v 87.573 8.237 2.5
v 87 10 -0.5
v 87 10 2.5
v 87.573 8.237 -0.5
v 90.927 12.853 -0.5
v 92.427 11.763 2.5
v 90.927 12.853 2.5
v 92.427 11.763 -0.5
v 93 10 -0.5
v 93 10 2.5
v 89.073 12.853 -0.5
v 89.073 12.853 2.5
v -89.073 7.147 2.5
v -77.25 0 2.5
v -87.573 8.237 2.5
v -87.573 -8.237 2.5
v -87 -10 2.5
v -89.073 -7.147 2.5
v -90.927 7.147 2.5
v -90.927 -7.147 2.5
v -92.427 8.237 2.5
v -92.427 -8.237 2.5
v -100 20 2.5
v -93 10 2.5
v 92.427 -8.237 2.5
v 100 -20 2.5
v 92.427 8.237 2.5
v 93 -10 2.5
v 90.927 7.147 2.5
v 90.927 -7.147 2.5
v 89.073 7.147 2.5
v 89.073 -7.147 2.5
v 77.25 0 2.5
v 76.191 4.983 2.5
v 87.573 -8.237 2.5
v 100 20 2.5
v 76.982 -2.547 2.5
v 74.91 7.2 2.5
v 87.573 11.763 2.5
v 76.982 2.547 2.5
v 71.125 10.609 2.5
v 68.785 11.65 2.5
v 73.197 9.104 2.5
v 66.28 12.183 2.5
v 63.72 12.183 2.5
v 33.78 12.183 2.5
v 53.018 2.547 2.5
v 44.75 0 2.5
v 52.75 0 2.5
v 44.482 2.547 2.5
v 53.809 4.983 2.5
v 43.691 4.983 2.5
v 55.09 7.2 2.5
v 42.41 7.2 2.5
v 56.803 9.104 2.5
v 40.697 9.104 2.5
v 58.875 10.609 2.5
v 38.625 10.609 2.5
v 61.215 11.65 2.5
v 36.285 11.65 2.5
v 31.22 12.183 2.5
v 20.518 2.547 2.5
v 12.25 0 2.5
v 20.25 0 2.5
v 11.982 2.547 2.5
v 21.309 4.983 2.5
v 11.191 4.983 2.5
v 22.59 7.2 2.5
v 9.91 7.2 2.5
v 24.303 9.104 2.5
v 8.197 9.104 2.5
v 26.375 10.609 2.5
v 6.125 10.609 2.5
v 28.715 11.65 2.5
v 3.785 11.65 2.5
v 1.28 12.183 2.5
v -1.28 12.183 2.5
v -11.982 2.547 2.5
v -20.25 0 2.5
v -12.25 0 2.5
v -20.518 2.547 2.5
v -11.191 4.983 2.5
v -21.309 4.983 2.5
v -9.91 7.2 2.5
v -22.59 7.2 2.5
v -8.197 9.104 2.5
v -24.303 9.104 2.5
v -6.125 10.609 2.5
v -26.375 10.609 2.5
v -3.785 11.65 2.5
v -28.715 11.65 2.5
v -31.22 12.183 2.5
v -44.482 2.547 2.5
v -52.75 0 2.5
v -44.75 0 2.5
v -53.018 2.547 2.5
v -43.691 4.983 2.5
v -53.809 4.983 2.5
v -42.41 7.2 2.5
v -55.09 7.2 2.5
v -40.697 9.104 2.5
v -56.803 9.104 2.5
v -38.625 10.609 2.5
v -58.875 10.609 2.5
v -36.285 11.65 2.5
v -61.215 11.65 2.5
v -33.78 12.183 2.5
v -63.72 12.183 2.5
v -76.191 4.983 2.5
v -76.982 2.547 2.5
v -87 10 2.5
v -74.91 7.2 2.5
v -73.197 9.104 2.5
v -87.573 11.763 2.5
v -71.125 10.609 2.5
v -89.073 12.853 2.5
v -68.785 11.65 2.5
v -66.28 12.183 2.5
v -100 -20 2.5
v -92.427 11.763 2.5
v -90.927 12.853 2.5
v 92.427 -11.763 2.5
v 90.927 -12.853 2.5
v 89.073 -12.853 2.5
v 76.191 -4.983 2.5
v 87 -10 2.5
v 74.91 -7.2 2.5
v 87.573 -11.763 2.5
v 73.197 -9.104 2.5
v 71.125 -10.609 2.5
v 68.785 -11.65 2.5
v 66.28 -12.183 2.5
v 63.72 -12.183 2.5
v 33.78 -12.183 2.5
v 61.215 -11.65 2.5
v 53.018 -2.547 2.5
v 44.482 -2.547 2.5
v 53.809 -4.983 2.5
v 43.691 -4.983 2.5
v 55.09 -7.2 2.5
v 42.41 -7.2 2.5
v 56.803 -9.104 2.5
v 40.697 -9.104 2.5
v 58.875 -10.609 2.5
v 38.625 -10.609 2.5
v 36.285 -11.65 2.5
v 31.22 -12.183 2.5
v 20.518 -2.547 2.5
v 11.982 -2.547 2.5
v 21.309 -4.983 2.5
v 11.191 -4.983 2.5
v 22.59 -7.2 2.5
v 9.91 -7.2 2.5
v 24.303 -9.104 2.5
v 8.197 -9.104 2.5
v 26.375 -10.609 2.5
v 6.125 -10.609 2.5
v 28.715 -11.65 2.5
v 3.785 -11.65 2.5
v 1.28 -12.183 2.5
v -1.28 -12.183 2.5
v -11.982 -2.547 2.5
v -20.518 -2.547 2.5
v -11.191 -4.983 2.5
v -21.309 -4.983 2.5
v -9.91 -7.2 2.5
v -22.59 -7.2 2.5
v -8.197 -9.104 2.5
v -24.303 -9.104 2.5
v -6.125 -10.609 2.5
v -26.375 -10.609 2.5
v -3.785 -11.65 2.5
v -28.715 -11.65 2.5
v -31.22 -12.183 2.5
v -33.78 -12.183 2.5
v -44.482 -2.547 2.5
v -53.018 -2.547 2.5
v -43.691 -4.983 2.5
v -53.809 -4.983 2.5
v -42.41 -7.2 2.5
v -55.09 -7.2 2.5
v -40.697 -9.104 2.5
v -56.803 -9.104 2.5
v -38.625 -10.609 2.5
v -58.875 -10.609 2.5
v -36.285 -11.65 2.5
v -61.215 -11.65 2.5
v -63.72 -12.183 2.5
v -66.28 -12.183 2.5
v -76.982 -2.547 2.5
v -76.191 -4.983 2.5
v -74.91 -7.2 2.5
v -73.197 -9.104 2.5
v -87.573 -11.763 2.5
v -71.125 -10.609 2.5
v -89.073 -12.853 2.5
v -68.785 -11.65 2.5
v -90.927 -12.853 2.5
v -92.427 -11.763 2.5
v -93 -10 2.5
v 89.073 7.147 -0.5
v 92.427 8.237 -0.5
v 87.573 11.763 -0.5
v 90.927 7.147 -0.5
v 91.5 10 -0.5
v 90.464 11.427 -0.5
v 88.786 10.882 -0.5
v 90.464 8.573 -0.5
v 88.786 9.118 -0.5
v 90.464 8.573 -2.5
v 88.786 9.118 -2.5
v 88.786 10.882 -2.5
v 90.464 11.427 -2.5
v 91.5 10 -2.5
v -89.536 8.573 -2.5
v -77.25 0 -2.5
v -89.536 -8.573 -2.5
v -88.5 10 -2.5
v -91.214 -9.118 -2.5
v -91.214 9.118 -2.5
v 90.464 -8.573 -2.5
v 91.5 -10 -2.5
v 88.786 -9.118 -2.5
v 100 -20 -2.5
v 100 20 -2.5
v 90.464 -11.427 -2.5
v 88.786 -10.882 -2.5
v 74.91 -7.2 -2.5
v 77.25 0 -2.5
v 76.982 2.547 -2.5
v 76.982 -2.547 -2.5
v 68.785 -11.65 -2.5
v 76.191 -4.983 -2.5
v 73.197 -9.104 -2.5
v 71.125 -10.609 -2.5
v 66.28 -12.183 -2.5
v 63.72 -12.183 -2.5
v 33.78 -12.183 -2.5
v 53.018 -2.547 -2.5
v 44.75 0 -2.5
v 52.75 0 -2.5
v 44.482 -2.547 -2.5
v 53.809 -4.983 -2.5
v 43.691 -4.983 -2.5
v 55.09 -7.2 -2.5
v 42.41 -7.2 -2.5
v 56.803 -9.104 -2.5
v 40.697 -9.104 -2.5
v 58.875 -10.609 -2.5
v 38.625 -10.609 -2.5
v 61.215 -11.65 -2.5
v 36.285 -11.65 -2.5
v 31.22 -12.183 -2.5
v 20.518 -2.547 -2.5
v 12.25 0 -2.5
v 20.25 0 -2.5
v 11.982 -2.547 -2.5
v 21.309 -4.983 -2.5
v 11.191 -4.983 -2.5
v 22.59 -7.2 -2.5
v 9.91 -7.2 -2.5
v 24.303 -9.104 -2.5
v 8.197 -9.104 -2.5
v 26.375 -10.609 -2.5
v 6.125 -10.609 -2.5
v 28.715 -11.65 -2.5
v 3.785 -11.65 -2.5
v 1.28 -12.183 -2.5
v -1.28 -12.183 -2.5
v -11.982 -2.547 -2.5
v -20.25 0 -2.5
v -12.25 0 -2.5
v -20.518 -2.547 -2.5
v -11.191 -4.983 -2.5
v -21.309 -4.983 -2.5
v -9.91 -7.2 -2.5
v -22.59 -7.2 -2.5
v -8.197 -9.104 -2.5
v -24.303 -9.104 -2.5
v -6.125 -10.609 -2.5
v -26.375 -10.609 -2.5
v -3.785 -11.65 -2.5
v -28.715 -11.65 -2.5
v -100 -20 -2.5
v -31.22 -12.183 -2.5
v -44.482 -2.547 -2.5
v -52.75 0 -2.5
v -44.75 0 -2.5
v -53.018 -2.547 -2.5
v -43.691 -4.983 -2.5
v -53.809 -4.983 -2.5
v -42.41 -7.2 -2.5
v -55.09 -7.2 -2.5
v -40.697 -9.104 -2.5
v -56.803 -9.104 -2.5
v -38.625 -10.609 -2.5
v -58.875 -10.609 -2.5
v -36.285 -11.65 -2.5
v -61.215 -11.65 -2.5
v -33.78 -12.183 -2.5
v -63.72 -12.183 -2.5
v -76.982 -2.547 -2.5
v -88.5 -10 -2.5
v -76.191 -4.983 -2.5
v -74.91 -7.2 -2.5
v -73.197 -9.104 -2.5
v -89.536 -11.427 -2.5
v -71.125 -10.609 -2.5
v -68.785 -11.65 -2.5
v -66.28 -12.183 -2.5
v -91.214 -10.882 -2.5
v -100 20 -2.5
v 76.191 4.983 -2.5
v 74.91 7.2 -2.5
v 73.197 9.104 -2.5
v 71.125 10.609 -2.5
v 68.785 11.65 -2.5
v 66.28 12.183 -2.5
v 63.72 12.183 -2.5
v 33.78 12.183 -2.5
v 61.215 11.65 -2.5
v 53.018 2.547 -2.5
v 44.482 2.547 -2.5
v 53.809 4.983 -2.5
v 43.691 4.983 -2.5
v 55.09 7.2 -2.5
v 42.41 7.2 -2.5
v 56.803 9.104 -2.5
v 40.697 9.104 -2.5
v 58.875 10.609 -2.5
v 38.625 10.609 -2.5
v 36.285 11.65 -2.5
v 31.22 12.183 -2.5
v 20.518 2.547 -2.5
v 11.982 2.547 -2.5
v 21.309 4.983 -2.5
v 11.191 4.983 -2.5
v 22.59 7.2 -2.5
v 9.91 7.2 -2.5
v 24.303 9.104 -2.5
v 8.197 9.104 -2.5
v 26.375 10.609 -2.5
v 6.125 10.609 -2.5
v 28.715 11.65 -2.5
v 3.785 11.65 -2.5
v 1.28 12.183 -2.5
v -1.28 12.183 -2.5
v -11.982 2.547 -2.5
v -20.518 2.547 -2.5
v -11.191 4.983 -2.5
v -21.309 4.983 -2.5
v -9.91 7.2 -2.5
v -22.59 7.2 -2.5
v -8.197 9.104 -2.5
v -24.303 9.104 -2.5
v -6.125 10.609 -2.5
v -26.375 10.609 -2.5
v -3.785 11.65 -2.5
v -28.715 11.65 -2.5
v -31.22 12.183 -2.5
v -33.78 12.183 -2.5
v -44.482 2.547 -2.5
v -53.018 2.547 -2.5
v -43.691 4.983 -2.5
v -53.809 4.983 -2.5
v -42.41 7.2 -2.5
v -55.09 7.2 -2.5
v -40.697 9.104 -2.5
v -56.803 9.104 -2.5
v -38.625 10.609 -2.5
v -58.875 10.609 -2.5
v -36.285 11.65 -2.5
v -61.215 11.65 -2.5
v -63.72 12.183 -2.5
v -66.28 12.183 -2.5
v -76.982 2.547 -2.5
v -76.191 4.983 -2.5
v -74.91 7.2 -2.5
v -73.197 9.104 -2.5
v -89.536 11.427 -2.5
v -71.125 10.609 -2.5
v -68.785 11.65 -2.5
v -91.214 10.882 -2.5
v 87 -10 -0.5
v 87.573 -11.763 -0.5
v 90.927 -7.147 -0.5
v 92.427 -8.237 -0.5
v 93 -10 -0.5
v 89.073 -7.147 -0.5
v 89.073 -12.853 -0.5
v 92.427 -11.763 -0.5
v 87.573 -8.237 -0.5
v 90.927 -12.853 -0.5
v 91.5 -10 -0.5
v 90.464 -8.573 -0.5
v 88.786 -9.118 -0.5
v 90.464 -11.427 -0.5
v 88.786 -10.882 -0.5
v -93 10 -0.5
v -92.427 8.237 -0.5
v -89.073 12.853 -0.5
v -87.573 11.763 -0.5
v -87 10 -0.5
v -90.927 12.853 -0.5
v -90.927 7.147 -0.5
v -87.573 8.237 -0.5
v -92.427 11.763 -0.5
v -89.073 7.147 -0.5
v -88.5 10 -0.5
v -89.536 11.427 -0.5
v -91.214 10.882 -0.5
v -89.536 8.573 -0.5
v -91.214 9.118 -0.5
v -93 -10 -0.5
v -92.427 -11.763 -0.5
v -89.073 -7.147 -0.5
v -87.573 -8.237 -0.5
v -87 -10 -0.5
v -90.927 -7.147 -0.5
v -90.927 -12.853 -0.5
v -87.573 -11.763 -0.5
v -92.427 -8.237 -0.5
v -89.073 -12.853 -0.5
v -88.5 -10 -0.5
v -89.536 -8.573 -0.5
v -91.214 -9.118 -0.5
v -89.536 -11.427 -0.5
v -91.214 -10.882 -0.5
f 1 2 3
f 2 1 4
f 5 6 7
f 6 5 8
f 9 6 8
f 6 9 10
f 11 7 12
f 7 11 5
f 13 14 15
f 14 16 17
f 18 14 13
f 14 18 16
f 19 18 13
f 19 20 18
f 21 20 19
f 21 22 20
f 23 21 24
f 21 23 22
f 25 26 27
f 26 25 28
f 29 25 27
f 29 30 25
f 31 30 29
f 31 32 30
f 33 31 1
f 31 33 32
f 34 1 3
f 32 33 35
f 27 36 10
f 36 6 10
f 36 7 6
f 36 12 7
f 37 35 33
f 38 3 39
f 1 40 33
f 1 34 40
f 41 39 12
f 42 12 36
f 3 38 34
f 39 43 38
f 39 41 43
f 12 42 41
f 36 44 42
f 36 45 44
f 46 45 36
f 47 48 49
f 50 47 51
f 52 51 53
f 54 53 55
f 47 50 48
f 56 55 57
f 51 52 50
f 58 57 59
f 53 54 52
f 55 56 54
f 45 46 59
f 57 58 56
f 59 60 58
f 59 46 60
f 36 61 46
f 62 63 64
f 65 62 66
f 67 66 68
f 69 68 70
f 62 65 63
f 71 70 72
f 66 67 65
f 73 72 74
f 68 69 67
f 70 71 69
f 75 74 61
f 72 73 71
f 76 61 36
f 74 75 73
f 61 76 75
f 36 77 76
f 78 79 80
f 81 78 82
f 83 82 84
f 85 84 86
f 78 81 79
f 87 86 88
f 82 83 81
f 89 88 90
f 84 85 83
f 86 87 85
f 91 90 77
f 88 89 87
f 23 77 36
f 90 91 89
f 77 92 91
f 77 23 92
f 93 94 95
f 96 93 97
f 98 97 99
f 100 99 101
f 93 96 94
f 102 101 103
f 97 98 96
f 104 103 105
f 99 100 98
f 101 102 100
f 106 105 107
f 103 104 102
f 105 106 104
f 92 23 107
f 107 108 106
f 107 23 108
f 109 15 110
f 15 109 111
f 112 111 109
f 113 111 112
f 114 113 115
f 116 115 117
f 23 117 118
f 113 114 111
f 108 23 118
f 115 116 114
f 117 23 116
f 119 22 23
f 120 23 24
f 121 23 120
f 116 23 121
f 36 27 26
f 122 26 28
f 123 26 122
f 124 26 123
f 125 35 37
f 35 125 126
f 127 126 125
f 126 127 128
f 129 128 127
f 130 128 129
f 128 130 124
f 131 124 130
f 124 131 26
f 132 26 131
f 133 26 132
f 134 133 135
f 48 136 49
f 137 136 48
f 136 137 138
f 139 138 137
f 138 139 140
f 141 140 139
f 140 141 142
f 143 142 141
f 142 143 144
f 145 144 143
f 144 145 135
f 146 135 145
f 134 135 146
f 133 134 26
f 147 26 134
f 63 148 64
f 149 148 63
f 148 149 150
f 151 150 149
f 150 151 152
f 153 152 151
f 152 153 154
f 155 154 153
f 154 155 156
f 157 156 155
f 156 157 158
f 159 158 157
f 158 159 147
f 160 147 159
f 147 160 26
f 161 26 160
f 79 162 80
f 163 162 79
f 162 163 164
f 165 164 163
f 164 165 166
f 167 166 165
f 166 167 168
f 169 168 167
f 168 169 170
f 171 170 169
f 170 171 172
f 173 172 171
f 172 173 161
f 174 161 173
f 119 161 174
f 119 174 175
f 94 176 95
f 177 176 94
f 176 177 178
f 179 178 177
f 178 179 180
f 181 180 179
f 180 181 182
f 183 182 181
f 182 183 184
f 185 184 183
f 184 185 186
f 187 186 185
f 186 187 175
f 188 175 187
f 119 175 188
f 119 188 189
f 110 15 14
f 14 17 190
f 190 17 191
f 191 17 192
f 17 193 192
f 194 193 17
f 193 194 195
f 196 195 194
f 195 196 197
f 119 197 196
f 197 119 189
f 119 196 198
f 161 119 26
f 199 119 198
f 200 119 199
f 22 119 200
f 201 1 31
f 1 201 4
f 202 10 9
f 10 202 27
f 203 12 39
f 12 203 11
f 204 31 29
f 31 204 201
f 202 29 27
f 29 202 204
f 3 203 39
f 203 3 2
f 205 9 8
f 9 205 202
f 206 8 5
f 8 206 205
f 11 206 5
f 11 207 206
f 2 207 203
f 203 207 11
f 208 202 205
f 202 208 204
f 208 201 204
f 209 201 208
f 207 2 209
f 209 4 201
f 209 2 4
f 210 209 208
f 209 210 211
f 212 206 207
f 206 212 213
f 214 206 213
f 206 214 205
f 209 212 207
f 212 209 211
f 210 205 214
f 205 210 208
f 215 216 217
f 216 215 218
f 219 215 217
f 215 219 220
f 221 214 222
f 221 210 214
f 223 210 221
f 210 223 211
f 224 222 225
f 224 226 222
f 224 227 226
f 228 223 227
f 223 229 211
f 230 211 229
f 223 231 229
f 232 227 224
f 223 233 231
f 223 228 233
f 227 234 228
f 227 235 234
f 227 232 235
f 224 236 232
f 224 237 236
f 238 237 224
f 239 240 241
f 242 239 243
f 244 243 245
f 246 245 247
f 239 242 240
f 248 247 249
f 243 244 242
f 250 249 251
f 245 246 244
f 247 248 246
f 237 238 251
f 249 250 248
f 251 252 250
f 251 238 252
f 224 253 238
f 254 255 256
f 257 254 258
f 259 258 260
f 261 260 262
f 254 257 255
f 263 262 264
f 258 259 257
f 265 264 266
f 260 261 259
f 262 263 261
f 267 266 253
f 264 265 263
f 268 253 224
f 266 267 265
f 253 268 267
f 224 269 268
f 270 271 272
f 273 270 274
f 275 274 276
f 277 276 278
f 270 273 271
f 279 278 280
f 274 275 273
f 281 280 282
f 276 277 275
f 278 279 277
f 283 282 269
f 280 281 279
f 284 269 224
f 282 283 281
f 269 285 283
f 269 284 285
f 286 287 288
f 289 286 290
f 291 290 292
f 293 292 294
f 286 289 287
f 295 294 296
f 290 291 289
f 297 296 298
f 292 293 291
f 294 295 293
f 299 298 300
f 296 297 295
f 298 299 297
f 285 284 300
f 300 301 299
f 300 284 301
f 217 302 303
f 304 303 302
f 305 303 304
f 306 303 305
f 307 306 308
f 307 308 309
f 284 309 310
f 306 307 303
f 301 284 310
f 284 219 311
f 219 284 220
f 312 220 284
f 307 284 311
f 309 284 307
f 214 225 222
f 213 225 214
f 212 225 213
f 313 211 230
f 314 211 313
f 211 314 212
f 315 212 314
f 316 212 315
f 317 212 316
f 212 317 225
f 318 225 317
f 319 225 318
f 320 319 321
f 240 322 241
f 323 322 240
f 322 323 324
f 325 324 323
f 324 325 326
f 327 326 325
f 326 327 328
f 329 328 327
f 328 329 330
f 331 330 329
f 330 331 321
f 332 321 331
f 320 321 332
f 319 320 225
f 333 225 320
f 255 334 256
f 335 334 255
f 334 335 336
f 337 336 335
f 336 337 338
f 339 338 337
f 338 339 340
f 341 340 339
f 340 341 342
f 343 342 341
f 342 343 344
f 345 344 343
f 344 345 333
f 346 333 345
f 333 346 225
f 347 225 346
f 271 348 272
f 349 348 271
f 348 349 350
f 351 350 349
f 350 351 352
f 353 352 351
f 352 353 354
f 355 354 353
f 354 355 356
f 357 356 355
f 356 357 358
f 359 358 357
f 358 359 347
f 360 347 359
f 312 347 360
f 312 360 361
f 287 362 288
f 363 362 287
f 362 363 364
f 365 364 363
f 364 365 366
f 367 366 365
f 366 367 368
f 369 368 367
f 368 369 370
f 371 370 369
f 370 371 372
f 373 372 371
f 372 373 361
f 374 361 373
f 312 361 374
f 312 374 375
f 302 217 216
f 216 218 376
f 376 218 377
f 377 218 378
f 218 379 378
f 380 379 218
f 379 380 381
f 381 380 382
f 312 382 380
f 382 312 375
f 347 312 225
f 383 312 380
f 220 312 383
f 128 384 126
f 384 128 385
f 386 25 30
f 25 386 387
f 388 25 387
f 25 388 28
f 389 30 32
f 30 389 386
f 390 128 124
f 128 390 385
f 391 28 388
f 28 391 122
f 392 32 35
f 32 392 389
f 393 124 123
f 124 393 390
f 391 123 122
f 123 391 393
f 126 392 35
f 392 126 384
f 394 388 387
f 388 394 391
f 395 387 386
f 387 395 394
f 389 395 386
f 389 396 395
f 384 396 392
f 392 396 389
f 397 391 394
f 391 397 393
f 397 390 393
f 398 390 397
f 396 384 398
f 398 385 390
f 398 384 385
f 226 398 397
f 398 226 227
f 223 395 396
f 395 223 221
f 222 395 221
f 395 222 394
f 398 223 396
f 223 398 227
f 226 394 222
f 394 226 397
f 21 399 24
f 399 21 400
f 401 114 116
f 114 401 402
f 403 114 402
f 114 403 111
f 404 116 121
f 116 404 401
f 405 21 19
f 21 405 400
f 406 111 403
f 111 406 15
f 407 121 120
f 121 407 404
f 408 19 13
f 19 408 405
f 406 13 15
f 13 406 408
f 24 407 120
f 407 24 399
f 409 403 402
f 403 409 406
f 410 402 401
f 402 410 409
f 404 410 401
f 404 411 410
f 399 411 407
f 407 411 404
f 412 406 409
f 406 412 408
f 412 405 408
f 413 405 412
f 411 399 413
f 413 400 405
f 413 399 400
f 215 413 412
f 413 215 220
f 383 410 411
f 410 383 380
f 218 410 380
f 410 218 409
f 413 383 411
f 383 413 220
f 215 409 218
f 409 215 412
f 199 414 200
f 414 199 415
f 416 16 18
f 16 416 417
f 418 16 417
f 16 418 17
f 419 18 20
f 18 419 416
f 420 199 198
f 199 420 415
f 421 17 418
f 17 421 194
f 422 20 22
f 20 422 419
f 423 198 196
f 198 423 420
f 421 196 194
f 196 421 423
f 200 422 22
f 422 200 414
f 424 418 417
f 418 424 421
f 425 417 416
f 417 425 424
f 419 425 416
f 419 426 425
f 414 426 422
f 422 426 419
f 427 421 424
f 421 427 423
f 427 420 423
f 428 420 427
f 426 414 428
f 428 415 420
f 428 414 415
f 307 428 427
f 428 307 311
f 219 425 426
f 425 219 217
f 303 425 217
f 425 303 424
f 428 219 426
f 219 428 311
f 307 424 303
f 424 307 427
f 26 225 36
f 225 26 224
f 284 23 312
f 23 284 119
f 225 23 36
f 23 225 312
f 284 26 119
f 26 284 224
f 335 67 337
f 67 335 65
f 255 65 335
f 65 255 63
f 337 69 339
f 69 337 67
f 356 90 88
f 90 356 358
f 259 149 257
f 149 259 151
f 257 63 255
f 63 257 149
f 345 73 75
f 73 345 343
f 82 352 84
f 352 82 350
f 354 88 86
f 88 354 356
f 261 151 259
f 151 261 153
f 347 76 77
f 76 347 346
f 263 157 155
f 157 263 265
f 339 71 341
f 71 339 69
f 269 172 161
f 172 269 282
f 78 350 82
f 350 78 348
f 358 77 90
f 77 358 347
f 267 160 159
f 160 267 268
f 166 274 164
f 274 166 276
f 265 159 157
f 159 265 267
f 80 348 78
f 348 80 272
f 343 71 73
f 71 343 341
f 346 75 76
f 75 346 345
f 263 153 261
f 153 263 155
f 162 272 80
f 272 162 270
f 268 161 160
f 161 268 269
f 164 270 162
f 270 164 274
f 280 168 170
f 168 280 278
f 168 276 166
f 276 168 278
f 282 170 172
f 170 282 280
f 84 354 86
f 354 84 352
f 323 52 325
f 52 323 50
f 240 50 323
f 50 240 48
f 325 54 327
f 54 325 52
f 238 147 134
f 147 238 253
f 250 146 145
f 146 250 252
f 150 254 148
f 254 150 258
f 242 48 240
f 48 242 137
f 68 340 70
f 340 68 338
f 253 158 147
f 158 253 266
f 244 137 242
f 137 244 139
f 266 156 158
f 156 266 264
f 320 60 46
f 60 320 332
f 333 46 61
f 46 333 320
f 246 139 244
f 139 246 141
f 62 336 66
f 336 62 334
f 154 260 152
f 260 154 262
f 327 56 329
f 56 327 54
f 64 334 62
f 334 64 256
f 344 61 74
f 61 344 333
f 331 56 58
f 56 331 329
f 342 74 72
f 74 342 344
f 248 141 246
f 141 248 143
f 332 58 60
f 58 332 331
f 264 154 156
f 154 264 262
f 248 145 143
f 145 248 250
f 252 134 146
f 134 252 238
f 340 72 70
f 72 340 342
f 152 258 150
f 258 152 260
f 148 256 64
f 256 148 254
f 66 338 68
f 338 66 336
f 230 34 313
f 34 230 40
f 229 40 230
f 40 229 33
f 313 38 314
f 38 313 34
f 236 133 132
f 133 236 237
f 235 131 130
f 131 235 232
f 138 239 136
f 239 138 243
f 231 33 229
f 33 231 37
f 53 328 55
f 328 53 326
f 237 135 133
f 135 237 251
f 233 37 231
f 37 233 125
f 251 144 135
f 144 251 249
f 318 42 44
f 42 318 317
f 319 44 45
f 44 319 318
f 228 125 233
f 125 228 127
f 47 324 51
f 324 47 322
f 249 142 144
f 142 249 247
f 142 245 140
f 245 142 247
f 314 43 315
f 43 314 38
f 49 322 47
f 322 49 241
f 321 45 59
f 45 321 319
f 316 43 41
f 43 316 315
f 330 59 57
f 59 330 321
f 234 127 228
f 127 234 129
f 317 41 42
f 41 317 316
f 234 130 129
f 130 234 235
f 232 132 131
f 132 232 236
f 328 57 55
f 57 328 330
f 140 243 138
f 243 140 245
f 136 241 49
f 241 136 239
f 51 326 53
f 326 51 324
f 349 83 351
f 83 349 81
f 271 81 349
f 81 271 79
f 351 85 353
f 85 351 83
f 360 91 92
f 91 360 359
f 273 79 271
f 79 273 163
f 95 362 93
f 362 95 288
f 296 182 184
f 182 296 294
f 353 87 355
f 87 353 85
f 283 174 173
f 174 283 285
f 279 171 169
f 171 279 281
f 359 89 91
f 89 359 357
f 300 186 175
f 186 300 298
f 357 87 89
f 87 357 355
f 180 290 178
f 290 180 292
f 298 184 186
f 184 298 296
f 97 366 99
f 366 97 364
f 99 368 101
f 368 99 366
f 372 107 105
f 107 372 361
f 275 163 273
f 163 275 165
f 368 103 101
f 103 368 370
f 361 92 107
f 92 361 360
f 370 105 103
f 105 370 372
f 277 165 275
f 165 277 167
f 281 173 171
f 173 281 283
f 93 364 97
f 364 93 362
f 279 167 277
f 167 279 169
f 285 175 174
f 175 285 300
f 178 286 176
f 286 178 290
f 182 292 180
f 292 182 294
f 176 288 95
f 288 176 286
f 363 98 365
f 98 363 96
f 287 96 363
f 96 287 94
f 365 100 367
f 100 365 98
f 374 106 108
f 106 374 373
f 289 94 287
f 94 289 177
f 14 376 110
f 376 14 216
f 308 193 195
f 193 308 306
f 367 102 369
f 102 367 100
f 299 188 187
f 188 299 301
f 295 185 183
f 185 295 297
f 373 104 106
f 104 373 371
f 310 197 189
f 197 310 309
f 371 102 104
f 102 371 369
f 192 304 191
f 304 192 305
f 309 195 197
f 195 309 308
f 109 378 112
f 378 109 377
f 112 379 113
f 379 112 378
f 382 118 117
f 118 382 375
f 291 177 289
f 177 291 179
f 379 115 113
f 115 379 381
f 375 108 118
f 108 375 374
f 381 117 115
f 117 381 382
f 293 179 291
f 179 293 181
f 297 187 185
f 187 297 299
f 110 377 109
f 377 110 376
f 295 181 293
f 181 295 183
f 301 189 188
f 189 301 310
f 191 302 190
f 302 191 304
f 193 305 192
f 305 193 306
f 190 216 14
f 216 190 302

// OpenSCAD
difference($fn=100) {
  length = 200;
  length1 = length / 2;

  width = 40;
  width1 = width / 2;

  height = 5;
  height1 = height / 2;

  cube([length, width, height], true);

  // Nut heads
  x = length1 - 10;
  y = width1 - 10;
  z = 0;

  translate([x, y, z])
    m3_head_insert();
  translate([x, -y, z])
    m3_head_insert();
  translate([-x, y, z])
    m3_head_insert();
  translate([-x, -y, z])
    m3_head_insert();
  
  // Decorative holes
  translate([0, 0, 0])
    cylinder(d = 24.5, h = 5, center = true);
  translate([32.5, 0, 0])
    cylinder(d = 24.5, h = 5, center = true);
  translate([65, 0, 0])
    cylinder(d = 24.5, h = 5, center = true);
  translate([-32.5, 0, 0])
    cylinder(d = 24.5, h = 5, center = true);
  translate([-65, 0, 0])
    cylinder(d = 24.5, h = 5, center = true);
}

module m3_head_insert() {
  union() {
    translate([0, 0, 1])
      cylinder(d = 6, h = 3, center = true);
    translate([0, 0, -1.5])
      cylinder(d = 3, h = 2, center = true);
  }
}
